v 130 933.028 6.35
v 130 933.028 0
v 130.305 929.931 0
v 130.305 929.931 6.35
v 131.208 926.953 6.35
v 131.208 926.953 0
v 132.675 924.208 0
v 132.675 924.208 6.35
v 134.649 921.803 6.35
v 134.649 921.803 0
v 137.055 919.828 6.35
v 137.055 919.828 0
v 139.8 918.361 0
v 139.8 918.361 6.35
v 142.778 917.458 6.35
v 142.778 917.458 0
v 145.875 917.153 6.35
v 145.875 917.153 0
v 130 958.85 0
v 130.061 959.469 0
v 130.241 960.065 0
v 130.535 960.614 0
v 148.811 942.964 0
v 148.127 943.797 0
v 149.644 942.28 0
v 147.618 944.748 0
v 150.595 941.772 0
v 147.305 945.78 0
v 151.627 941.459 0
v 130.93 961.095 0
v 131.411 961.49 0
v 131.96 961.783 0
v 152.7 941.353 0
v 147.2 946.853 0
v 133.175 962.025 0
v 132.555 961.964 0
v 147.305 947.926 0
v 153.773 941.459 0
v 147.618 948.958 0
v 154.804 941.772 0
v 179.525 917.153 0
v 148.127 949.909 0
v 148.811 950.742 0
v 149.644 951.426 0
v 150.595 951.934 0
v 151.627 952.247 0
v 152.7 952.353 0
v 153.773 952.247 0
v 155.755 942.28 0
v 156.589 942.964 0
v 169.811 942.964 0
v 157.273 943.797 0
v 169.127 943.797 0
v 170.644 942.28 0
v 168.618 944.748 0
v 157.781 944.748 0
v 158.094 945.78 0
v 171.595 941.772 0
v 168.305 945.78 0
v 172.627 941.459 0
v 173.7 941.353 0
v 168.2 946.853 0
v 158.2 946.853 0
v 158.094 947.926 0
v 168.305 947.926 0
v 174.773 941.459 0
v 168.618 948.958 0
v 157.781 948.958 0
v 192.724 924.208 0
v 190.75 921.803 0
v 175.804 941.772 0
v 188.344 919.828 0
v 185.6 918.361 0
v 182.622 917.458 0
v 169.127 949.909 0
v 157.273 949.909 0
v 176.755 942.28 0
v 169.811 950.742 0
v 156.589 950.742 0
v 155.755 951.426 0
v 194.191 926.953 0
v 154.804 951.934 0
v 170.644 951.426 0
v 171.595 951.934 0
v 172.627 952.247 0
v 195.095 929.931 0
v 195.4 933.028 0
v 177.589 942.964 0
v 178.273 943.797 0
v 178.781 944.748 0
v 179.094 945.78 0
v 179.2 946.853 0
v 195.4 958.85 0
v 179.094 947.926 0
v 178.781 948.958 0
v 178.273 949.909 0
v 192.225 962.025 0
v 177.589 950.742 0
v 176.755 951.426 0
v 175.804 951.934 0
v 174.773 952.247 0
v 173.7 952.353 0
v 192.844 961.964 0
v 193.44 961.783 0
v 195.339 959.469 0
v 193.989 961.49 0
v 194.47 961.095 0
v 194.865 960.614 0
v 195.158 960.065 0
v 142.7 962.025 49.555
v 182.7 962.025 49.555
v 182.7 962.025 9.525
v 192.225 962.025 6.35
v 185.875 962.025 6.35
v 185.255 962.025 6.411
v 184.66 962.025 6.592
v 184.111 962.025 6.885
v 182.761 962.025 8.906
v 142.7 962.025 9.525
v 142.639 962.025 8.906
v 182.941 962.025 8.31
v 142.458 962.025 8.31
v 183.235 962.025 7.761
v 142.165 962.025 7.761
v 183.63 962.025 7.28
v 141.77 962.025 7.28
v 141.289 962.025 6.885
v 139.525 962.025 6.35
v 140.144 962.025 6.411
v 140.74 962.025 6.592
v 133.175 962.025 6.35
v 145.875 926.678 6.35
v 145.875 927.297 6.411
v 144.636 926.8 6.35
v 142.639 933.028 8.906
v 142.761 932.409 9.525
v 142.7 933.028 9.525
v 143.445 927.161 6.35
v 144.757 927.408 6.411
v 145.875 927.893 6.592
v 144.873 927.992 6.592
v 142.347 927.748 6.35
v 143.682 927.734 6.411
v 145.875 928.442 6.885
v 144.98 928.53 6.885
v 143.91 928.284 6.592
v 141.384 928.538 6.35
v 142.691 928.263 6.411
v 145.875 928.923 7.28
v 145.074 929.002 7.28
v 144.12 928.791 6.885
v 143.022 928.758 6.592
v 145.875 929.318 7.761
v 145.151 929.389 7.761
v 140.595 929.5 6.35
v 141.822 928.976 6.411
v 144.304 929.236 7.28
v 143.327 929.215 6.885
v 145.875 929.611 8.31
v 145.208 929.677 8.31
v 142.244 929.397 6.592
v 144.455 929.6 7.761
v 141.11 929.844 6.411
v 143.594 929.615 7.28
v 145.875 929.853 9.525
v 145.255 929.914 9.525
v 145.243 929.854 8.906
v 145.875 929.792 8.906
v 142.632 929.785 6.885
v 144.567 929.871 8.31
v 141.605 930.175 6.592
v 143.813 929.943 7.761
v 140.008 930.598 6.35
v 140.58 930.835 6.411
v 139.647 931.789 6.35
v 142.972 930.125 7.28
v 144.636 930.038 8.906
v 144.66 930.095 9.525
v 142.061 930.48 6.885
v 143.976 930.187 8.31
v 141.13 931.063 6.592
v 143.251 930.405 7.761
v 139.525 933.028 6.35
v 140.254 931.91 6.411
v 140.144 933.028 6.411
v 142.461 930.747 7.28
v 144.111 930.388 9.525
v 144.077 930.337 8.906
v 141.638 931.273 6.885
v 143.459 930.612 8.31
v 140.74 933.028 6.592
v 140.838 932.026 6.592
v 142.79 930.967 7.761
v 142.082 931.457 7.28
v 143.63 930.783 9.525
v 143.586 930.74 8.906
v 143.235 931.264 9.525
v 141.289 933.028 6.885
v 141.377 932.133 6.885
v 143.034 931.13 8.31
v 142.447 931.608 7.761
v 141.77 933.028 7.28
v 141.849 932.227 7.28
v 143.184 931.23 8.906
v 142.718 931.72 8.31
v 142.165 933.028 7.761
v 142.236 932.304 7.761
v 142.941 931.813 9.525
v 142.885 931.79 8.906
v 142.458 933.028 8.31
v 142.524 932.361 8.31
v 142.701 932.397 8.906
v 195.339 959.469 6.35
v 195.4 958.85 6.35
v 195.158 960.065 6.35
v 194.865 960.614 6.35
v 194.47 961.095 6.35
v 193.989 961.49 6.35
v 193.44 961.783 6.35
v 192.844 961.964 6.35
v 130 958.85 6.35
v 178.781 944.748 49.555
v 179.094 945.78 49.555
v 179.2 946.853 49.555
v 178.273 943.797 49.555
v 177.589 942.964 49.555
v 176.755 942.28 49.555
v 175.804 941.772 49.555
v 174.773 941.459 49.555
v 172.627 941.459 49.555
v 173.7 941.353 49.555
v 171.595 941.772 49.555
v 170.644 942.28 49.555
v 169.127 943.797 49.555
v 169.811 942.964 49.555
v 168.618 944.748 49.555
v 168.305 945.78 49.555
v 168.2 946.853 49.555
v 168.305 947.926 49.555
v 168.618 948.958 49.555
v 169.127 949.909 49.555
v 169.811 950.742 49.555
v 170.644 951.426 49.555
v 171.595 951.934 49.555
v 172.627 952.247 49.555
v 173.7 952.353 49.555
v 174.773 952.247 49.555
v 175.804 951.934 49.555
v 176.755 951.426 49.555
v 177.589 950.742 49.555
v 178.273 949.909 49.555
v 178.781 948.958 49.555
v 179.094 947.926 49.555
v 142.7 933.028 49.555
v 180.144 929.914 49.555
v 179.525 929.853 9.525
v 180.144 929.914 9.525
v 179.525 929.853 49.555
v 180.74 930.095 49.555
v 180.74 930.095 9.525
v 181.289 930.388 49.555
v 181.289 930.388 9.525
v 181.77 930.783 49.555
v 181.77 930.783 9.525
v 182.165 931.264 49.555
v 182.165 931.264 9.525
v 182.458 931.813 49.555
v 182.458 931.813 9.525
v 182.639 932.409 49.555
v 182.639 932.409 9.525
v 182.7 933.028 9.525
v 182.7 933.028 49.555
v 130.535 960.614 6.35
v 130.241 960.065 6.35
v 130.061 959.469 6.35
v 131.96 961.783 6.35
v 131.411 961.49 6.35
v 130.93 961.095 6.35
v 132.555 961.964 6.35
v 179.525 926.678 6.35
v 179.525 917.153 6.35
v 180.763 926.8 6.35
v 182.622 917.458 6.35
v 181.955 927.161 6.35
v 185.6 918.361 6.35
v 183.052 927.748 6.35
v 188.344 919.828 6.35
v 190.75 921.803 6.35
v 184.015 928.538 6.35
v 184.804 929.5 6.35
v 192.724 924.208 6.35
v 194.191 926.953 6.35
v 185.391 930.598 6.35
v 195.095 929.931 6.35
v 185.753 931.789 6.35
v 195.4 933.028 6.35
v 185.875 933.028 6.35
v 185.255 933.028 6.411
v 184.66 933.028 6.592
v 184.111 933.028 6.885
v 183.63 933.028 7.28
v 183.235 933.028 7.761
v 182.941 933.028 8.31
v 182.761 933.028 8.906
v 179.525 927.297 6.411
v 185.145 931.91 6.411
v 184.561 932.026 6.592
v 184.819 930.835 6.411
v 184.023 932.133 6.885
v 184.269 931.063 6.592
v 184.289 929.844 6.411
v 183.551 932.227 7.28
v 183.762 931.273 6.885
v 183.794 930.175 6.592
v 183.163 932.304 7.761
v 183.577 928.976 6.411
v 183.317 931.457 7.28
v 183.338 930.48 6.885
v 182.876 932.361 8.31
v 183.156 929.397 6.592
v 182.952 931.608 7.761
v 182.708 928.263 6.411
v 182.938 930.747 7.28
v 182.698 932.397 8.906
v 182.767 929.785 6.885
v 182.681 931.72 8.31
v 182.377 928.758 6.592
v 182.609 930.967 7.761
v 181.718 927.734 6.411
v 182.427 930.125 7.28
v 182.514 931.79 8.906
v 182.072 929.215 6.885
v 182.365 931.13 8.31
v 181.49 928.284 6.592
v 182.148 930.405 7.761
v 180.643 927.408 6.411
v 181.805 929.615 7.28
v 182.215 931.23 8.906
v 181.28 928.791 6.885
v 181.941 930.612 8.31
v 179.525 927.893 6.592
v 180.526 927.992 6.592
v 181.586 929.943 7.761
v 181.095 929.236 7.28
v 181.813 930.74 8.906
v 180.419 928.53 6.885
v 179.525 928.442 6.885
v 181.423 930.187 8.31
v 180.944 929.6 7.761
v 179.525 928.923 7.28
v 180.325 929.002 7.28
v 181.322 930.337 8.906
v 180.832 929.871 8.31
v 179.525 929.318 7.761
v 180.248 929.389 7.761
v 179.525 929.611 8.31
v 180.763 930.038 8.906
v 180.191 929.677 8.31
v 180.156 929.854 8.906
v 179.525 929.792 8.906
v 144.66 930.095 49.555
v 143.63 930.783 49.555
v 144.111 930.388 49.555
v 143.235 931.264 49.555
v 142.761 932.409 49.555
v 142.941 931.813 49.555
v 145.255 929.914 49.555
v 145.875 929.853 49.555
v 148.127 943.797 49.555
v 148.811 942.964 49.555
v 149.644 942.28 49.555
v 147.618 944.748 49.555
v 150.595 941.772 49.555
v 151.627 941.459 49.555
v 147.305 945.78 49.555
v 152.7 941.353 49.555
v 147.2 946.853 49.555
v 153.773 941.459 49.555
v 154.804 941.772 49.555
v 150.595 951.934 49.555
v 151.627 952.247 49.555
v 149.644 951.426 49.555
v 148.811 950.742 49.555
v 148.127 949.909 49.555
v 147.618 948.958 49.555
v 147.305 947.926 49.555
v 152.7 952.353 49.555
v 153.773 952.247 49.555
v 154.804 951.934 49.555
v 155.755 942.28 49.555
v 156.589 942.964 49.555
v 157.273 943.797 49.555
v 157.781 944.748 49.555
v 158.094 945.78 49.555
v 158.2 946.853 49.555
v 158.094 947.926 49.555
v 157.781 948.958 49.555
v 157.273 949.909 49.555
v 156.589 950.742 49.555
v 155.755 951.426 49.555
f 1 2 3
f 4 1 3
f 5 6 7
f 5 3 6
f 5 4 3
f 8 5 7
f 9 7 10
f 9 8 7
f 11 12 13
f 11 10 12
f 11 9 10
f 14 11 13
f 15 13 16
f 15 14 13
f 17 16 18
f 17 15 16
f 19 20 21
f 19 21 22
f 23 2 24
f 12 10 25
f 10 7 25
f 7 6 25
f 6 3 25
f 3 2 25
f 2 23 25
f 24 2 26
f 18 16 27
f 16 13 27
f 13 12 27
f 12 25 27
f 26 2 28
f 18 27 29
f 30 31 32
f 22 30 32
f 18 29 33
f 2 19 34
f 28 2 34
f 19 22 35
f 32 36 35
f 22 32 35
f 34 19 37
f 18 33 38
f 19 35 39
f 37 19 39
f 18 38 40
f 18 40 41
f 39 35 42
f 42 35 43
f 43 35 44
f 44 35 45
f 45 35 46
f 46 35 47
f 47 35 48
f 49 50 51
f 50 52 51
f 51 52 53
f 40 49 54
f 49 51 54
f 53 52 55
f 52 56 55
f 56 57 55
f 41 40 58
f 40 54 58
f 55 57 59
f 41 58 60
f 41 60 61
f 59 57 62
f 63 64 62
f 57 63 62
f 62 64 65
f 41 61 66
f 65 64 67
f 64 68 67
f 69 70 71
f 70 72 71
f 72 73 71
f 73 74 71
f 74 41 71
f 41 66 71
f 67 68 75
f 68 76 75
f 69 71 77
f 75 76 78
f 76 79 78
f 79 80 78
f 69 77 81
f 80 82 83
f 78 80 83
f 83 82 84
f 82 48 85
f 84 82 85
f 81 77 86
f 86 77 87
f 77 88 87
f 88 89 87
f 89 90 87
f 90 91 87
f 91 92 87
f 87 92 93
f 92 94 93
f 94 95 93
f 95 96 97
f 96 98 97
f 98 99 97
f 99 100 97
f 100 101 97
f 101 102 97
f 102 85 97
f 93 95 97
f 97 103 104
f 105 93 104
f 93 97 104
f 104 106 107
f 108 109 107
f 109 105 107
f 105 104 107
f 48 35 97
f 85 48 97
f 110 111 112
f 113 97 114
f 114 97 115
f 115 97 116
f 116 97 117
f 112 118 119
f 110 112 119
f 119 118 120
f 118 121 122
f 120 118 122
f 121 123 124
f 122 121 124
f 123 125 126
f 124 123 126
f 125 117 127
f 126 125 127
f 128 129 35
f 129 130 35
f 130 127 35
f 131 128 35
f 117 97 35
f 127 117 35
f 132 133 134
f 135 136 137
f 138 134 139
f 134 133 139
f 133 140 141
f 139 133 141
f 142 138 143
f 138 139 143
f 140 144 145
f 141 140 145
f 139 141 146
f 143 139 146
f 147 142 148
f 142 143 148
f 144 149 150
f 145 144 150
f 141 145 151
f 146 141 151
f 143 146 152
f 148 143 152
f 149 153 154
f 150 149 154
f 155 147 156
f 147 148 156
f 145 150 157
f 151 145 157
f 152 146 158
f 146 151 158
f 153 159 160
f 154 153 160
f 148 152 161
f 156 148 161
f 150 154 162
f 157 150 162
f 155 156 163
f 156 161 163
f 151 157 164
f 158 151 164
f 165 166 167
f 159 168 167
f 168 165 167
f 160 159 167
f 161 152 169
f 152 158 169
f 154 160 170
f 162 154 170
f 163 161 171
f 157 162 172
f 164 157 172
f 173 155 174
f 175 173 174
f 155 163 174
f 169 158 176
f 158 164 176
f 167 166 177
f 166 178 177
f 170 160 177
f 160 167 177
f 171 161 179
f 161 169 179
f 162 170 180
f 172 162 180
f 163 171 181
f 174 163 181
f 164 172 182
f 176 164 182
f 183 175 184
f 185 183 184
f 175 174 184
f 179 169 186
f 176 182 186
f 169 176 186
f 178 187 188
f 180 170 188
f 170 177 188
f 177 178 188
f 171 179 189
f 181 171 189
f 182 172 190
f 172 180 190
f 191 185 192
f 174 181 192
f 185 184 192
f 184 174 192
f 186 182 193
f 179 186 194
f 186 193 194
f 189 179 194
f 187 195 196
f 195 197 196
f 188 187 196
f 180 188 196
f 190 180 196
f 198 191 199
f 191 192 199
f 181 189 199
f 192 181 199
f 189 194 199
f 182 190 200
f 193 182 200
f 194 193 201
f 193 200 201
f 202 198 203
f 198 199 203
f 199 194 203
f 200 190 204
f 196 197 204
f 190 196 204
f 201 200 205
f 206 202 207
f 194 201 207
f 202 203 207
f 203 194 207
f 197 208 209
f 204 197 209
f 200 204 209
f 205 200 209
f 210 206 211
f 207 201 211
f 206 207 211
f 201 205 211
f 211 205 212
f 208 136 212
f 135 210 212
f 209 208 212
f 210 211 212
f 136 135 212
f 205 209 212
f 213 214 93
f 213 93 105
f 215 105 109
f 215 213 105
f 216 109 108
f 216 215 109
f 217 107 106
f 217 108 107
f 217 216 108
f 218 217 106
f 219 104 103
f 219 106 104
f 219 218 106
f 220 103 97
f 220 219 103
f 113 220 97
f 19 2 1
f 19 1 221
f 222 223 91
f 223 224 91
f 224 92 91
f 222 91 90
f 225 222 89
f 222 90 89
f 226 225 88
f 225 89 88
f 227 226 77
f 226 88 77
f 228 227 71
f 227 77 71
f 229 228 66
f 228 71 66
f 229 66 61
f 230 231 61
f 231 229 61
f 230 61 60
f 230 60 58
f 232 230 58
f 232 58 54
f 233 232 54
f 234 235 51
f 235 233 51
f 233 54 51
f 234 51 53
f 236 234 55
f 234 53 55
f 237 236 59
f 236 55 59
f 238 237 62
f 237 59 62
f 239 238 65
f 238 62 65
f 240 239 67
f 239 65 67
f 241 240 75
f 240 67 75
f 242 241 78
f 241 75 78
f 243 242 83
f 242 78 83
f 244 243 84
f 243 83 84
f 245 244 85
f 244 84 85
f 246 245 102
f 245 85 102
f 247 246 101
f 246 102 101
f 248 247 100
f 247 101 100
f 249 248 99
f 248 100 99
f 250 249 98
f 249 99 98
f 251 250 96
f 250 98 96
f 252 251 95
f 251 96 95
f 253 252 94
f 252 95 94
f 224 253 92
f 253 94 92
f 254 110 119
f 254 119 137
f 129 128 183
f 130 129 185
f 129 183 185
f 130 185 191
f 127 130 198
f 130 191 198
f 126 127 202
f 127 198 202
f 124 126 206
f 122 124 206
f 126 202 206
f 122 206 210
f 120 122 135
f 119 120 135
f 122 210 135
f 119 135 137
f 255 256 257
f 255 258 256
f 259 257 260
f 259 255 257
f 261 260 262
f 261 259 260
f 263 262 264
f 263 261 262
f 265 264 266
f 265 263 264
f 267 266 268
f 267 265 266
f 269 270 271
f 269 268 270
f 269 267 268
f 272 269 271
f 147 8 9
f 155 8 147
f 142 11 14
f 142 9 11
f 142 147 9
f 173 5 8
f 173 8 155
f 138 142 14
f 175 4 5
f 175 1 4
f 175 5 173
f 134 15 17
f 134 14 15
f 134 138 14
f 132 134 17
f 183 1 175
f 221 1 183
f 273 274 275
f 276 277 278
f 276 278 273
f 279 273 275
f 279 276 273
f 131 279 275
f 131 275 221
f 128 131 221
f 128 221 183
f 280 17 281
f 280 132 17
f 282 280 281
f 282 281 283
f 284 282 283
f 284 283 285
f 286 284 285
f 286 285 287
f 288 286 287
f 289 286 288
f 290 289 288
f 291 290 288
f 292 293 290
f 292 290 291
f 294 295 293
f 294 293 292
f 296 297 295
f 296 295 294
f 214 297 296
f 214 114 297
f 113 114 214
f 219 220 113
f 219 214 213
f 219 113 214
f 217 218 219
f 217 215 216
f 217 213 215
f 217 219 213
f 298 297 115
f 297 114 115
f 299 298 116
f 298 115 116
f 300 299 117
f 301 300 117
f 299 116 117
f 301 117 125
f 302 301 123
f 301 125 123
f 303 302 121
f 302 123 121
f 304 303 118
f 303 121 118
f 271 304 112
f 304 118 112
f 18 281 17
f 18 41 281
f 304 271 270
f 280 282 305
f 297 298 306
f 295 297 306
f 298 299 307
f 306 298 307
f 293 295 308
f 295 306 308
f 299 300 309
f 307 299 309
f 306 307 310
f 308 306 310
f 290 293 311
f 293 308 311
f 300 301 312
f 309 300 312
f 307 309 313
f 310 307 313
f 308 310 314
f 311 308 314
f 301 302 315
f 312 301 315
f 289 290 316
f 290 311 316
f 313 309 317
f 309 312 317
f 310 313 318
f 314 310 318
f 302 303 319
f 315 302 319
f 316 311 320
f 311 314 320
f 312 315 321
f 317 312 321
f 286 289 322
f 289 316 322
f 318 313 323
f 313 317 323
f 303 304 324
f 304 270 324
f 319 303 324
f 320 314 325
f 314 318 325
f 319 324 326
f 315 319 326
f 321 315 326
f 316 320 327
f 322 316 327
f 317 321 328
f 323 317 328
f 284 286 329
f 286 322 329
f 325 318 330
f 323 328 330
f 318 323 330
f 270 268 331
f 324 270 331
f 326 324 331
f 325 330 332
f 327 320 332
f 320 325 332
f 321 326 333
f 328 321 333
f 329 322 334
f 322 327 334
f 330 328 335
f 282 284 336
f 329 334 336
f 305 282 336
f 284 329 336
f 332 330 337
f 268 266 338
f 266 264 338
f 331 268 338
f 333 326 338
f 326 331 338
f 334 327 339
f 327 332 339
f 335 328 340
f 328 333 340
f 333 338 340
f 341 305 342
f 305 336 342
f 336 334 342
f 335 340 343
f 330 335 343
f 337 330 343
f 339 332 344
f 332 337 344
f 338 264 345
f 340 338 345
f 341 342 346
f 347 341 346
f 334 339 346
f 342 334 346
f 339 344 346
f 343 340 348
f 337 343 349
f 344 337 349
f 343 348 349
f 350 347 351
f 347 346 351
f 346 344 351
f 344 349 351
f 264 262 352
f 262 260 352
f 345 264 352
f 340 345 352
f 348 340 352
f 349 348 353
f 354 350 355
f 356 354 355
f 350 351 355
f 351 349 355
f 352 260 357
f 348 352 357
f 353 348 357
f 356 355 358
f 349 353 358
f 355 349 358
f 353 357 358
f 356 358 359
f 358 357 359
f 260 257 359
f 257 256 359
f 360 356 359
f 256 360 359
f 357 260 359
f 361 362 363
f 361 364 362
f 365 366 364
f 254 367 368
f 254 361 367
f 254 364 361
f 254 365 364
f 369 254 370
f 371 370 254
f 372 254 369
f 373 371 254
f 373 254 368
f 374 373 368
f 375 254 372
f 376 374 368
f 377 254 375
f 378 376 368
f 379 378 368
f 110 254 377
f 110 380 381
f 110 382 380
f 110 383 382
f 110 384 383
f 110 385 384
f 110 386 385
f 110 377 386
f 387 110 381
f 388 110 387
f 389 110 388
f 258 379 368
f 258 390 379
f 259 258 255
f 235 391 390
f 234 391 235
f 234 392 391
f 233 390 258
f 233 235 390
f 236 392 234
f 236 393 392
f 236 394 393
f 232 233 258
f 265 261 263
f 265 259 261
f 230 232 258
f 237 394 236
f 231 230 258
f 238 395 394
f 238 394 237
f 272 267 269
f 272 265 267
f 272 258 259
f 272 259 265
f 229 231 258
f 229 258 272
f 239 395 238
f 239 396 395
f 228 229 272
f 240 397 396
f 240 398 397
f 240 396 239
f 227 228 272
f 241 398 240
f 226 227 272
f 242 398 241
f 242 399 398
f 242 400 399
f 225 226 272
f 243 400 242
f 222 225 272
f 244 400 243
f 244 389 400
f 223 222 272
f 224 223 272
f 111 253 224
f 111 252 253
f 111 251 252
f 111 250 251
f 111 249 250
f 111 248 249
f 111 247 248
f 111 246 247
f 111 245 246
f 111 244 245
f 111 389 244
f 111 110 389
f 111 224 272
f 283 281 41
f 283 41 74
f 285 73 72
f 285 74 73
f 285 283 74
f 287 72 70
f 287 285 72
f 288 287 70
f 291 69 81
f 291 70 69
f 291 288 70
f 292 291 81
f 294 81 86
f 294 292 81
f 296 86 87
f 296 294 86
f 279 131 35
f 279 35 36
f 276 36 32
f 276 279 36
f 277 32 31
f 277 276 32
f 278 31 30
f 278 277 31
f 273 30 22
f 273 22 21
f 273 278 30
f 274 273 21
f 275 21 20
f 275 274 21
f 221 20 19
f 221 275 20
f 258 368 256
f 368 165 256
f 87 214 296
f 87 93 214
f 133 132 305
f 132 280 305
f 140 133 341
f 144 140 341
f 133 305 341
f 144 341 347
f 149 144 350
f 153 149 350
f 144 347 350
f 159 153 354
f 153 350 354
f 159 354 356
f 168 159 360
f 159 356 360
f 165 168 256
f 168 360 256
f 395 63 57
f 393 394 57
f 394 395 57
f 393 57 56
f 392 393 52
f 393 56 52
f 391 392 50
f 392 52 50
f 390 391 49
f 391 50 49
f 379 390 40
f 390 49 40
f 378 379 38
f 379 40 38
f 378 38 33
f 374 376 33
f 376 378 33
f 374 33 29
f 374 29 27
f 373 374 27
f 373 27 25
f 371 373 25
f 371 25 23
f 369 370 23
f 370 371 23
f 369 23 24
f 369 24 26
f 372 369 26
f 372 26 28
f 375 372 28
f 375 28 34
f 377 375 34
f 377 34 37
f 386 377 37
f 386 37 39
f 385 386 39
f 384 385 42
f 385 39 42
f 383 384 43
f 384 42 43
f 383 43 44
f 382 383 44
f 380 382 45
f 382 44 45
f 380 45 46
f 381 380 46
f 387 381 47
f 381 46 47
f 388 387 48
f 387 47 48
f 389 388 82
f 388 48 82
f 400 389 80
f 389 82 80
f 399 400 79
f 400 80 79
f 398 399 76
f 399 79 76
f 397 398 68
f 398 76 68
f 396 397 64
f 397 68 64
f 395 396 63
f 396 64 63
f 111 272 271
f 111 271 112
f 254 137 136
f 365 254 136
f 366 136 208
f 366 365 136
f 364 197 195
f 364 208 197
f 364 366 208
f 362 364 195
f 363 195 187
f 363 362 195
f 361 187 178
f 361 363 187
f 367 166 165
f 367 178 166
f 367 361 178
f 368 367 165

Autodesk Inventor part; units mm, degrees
ref_plane "YZ Plane" through (0, 0, 0) normal (1, 0, 0) x (0, 1, 0)
ref_plane "XZ Plane" through (0, 0, 0) normal (0, 1, 0) x (-1, 0, 0)
ref_plane "XY Plane" through (0, 0, 0) normal (0, 0, 1) x (1, 0, 0)
ref_plane "Work Plane1" through (0, 0, 0) normal (0, 0, 1) x (1, 0, 0)
sketch "Sketch1" plane through (0, 0, 0) normal (0, 0, 1) x (1, 0, 0)
  circle A0 centre (173.6996, 946.853) radius 5.5 projected
  circle A1 centre (152.6996, 946.853) radius 5.5 projected
  line L0 (454.025, 962.025) -> (-295.275, 962.025) projected
  line L1 (-295.275, 962.025) -> (-295.275, -1057.275) projected
  line L2 (-295.275, -1057.275) -> (454.025, -1057.275) projected
  line L3 (454.025, -1057.275) -> (454.025, 962.025) projected
  circle A2 centre (396.1257, -28.5814) radius 31.4325 projected
  line L4 (182.6996, 962.025) -> (142.6996, 962.025)
  line L5 (142.6996, 962.025) -> (142.6996, 929.853)
  line L6 (142.6996, 929.853) -> (182.6996, 929.853)
  line L7 (182.6996, 929.853) -> (182.6996, 962.025)
  line L8 (195.3996, 917.153) -> (129.9996, 917.153)
  line L9 (129.9996, 917.153) -> (129.9996, 974.725)
  line L10 (129.9996, 974.725) -> (195.3996, 974.725)
  line L11 (195.3996, 974.725) -> (195.3996, 917.153)
  point P0 (0, 0)
  point P1 (182.6996, 963.853)
  point P2 (129.9996, 962.025)
  point P3 (195.3996, 962.025)
  dimension "d0" = 12.7
extrude "Extrusion1" add sketch "Sketch1" along normal blind 49.5554 contours L7 L6 L5 L0
extrude "Extrusion2" add sketch "Sketch1" along normal blind 6.35 contours L0 L11 L8 L9 L5 L6 L7
fillet "Fillet1" radius 3.175 5 edges at (182.6996, 945.939, 6.35) (162.6996, 929.853, 6.35) (142.6996, 945.939, 6.35) (142.6996, 929.853, 27.9527) (182.6996, 929.853, 27.9527)
fillet "Fillet2" radius 3.175 2 edges at (129.9996, 962.025, 3.175) (195.3996, 962.025, 3.175)
fillet "Fillet3" radius 15.875 2 edges at (129.9996, 917.153, 3.175) (195.3996, 917.153, 3.175)
properties part number "BracketSpacer"
